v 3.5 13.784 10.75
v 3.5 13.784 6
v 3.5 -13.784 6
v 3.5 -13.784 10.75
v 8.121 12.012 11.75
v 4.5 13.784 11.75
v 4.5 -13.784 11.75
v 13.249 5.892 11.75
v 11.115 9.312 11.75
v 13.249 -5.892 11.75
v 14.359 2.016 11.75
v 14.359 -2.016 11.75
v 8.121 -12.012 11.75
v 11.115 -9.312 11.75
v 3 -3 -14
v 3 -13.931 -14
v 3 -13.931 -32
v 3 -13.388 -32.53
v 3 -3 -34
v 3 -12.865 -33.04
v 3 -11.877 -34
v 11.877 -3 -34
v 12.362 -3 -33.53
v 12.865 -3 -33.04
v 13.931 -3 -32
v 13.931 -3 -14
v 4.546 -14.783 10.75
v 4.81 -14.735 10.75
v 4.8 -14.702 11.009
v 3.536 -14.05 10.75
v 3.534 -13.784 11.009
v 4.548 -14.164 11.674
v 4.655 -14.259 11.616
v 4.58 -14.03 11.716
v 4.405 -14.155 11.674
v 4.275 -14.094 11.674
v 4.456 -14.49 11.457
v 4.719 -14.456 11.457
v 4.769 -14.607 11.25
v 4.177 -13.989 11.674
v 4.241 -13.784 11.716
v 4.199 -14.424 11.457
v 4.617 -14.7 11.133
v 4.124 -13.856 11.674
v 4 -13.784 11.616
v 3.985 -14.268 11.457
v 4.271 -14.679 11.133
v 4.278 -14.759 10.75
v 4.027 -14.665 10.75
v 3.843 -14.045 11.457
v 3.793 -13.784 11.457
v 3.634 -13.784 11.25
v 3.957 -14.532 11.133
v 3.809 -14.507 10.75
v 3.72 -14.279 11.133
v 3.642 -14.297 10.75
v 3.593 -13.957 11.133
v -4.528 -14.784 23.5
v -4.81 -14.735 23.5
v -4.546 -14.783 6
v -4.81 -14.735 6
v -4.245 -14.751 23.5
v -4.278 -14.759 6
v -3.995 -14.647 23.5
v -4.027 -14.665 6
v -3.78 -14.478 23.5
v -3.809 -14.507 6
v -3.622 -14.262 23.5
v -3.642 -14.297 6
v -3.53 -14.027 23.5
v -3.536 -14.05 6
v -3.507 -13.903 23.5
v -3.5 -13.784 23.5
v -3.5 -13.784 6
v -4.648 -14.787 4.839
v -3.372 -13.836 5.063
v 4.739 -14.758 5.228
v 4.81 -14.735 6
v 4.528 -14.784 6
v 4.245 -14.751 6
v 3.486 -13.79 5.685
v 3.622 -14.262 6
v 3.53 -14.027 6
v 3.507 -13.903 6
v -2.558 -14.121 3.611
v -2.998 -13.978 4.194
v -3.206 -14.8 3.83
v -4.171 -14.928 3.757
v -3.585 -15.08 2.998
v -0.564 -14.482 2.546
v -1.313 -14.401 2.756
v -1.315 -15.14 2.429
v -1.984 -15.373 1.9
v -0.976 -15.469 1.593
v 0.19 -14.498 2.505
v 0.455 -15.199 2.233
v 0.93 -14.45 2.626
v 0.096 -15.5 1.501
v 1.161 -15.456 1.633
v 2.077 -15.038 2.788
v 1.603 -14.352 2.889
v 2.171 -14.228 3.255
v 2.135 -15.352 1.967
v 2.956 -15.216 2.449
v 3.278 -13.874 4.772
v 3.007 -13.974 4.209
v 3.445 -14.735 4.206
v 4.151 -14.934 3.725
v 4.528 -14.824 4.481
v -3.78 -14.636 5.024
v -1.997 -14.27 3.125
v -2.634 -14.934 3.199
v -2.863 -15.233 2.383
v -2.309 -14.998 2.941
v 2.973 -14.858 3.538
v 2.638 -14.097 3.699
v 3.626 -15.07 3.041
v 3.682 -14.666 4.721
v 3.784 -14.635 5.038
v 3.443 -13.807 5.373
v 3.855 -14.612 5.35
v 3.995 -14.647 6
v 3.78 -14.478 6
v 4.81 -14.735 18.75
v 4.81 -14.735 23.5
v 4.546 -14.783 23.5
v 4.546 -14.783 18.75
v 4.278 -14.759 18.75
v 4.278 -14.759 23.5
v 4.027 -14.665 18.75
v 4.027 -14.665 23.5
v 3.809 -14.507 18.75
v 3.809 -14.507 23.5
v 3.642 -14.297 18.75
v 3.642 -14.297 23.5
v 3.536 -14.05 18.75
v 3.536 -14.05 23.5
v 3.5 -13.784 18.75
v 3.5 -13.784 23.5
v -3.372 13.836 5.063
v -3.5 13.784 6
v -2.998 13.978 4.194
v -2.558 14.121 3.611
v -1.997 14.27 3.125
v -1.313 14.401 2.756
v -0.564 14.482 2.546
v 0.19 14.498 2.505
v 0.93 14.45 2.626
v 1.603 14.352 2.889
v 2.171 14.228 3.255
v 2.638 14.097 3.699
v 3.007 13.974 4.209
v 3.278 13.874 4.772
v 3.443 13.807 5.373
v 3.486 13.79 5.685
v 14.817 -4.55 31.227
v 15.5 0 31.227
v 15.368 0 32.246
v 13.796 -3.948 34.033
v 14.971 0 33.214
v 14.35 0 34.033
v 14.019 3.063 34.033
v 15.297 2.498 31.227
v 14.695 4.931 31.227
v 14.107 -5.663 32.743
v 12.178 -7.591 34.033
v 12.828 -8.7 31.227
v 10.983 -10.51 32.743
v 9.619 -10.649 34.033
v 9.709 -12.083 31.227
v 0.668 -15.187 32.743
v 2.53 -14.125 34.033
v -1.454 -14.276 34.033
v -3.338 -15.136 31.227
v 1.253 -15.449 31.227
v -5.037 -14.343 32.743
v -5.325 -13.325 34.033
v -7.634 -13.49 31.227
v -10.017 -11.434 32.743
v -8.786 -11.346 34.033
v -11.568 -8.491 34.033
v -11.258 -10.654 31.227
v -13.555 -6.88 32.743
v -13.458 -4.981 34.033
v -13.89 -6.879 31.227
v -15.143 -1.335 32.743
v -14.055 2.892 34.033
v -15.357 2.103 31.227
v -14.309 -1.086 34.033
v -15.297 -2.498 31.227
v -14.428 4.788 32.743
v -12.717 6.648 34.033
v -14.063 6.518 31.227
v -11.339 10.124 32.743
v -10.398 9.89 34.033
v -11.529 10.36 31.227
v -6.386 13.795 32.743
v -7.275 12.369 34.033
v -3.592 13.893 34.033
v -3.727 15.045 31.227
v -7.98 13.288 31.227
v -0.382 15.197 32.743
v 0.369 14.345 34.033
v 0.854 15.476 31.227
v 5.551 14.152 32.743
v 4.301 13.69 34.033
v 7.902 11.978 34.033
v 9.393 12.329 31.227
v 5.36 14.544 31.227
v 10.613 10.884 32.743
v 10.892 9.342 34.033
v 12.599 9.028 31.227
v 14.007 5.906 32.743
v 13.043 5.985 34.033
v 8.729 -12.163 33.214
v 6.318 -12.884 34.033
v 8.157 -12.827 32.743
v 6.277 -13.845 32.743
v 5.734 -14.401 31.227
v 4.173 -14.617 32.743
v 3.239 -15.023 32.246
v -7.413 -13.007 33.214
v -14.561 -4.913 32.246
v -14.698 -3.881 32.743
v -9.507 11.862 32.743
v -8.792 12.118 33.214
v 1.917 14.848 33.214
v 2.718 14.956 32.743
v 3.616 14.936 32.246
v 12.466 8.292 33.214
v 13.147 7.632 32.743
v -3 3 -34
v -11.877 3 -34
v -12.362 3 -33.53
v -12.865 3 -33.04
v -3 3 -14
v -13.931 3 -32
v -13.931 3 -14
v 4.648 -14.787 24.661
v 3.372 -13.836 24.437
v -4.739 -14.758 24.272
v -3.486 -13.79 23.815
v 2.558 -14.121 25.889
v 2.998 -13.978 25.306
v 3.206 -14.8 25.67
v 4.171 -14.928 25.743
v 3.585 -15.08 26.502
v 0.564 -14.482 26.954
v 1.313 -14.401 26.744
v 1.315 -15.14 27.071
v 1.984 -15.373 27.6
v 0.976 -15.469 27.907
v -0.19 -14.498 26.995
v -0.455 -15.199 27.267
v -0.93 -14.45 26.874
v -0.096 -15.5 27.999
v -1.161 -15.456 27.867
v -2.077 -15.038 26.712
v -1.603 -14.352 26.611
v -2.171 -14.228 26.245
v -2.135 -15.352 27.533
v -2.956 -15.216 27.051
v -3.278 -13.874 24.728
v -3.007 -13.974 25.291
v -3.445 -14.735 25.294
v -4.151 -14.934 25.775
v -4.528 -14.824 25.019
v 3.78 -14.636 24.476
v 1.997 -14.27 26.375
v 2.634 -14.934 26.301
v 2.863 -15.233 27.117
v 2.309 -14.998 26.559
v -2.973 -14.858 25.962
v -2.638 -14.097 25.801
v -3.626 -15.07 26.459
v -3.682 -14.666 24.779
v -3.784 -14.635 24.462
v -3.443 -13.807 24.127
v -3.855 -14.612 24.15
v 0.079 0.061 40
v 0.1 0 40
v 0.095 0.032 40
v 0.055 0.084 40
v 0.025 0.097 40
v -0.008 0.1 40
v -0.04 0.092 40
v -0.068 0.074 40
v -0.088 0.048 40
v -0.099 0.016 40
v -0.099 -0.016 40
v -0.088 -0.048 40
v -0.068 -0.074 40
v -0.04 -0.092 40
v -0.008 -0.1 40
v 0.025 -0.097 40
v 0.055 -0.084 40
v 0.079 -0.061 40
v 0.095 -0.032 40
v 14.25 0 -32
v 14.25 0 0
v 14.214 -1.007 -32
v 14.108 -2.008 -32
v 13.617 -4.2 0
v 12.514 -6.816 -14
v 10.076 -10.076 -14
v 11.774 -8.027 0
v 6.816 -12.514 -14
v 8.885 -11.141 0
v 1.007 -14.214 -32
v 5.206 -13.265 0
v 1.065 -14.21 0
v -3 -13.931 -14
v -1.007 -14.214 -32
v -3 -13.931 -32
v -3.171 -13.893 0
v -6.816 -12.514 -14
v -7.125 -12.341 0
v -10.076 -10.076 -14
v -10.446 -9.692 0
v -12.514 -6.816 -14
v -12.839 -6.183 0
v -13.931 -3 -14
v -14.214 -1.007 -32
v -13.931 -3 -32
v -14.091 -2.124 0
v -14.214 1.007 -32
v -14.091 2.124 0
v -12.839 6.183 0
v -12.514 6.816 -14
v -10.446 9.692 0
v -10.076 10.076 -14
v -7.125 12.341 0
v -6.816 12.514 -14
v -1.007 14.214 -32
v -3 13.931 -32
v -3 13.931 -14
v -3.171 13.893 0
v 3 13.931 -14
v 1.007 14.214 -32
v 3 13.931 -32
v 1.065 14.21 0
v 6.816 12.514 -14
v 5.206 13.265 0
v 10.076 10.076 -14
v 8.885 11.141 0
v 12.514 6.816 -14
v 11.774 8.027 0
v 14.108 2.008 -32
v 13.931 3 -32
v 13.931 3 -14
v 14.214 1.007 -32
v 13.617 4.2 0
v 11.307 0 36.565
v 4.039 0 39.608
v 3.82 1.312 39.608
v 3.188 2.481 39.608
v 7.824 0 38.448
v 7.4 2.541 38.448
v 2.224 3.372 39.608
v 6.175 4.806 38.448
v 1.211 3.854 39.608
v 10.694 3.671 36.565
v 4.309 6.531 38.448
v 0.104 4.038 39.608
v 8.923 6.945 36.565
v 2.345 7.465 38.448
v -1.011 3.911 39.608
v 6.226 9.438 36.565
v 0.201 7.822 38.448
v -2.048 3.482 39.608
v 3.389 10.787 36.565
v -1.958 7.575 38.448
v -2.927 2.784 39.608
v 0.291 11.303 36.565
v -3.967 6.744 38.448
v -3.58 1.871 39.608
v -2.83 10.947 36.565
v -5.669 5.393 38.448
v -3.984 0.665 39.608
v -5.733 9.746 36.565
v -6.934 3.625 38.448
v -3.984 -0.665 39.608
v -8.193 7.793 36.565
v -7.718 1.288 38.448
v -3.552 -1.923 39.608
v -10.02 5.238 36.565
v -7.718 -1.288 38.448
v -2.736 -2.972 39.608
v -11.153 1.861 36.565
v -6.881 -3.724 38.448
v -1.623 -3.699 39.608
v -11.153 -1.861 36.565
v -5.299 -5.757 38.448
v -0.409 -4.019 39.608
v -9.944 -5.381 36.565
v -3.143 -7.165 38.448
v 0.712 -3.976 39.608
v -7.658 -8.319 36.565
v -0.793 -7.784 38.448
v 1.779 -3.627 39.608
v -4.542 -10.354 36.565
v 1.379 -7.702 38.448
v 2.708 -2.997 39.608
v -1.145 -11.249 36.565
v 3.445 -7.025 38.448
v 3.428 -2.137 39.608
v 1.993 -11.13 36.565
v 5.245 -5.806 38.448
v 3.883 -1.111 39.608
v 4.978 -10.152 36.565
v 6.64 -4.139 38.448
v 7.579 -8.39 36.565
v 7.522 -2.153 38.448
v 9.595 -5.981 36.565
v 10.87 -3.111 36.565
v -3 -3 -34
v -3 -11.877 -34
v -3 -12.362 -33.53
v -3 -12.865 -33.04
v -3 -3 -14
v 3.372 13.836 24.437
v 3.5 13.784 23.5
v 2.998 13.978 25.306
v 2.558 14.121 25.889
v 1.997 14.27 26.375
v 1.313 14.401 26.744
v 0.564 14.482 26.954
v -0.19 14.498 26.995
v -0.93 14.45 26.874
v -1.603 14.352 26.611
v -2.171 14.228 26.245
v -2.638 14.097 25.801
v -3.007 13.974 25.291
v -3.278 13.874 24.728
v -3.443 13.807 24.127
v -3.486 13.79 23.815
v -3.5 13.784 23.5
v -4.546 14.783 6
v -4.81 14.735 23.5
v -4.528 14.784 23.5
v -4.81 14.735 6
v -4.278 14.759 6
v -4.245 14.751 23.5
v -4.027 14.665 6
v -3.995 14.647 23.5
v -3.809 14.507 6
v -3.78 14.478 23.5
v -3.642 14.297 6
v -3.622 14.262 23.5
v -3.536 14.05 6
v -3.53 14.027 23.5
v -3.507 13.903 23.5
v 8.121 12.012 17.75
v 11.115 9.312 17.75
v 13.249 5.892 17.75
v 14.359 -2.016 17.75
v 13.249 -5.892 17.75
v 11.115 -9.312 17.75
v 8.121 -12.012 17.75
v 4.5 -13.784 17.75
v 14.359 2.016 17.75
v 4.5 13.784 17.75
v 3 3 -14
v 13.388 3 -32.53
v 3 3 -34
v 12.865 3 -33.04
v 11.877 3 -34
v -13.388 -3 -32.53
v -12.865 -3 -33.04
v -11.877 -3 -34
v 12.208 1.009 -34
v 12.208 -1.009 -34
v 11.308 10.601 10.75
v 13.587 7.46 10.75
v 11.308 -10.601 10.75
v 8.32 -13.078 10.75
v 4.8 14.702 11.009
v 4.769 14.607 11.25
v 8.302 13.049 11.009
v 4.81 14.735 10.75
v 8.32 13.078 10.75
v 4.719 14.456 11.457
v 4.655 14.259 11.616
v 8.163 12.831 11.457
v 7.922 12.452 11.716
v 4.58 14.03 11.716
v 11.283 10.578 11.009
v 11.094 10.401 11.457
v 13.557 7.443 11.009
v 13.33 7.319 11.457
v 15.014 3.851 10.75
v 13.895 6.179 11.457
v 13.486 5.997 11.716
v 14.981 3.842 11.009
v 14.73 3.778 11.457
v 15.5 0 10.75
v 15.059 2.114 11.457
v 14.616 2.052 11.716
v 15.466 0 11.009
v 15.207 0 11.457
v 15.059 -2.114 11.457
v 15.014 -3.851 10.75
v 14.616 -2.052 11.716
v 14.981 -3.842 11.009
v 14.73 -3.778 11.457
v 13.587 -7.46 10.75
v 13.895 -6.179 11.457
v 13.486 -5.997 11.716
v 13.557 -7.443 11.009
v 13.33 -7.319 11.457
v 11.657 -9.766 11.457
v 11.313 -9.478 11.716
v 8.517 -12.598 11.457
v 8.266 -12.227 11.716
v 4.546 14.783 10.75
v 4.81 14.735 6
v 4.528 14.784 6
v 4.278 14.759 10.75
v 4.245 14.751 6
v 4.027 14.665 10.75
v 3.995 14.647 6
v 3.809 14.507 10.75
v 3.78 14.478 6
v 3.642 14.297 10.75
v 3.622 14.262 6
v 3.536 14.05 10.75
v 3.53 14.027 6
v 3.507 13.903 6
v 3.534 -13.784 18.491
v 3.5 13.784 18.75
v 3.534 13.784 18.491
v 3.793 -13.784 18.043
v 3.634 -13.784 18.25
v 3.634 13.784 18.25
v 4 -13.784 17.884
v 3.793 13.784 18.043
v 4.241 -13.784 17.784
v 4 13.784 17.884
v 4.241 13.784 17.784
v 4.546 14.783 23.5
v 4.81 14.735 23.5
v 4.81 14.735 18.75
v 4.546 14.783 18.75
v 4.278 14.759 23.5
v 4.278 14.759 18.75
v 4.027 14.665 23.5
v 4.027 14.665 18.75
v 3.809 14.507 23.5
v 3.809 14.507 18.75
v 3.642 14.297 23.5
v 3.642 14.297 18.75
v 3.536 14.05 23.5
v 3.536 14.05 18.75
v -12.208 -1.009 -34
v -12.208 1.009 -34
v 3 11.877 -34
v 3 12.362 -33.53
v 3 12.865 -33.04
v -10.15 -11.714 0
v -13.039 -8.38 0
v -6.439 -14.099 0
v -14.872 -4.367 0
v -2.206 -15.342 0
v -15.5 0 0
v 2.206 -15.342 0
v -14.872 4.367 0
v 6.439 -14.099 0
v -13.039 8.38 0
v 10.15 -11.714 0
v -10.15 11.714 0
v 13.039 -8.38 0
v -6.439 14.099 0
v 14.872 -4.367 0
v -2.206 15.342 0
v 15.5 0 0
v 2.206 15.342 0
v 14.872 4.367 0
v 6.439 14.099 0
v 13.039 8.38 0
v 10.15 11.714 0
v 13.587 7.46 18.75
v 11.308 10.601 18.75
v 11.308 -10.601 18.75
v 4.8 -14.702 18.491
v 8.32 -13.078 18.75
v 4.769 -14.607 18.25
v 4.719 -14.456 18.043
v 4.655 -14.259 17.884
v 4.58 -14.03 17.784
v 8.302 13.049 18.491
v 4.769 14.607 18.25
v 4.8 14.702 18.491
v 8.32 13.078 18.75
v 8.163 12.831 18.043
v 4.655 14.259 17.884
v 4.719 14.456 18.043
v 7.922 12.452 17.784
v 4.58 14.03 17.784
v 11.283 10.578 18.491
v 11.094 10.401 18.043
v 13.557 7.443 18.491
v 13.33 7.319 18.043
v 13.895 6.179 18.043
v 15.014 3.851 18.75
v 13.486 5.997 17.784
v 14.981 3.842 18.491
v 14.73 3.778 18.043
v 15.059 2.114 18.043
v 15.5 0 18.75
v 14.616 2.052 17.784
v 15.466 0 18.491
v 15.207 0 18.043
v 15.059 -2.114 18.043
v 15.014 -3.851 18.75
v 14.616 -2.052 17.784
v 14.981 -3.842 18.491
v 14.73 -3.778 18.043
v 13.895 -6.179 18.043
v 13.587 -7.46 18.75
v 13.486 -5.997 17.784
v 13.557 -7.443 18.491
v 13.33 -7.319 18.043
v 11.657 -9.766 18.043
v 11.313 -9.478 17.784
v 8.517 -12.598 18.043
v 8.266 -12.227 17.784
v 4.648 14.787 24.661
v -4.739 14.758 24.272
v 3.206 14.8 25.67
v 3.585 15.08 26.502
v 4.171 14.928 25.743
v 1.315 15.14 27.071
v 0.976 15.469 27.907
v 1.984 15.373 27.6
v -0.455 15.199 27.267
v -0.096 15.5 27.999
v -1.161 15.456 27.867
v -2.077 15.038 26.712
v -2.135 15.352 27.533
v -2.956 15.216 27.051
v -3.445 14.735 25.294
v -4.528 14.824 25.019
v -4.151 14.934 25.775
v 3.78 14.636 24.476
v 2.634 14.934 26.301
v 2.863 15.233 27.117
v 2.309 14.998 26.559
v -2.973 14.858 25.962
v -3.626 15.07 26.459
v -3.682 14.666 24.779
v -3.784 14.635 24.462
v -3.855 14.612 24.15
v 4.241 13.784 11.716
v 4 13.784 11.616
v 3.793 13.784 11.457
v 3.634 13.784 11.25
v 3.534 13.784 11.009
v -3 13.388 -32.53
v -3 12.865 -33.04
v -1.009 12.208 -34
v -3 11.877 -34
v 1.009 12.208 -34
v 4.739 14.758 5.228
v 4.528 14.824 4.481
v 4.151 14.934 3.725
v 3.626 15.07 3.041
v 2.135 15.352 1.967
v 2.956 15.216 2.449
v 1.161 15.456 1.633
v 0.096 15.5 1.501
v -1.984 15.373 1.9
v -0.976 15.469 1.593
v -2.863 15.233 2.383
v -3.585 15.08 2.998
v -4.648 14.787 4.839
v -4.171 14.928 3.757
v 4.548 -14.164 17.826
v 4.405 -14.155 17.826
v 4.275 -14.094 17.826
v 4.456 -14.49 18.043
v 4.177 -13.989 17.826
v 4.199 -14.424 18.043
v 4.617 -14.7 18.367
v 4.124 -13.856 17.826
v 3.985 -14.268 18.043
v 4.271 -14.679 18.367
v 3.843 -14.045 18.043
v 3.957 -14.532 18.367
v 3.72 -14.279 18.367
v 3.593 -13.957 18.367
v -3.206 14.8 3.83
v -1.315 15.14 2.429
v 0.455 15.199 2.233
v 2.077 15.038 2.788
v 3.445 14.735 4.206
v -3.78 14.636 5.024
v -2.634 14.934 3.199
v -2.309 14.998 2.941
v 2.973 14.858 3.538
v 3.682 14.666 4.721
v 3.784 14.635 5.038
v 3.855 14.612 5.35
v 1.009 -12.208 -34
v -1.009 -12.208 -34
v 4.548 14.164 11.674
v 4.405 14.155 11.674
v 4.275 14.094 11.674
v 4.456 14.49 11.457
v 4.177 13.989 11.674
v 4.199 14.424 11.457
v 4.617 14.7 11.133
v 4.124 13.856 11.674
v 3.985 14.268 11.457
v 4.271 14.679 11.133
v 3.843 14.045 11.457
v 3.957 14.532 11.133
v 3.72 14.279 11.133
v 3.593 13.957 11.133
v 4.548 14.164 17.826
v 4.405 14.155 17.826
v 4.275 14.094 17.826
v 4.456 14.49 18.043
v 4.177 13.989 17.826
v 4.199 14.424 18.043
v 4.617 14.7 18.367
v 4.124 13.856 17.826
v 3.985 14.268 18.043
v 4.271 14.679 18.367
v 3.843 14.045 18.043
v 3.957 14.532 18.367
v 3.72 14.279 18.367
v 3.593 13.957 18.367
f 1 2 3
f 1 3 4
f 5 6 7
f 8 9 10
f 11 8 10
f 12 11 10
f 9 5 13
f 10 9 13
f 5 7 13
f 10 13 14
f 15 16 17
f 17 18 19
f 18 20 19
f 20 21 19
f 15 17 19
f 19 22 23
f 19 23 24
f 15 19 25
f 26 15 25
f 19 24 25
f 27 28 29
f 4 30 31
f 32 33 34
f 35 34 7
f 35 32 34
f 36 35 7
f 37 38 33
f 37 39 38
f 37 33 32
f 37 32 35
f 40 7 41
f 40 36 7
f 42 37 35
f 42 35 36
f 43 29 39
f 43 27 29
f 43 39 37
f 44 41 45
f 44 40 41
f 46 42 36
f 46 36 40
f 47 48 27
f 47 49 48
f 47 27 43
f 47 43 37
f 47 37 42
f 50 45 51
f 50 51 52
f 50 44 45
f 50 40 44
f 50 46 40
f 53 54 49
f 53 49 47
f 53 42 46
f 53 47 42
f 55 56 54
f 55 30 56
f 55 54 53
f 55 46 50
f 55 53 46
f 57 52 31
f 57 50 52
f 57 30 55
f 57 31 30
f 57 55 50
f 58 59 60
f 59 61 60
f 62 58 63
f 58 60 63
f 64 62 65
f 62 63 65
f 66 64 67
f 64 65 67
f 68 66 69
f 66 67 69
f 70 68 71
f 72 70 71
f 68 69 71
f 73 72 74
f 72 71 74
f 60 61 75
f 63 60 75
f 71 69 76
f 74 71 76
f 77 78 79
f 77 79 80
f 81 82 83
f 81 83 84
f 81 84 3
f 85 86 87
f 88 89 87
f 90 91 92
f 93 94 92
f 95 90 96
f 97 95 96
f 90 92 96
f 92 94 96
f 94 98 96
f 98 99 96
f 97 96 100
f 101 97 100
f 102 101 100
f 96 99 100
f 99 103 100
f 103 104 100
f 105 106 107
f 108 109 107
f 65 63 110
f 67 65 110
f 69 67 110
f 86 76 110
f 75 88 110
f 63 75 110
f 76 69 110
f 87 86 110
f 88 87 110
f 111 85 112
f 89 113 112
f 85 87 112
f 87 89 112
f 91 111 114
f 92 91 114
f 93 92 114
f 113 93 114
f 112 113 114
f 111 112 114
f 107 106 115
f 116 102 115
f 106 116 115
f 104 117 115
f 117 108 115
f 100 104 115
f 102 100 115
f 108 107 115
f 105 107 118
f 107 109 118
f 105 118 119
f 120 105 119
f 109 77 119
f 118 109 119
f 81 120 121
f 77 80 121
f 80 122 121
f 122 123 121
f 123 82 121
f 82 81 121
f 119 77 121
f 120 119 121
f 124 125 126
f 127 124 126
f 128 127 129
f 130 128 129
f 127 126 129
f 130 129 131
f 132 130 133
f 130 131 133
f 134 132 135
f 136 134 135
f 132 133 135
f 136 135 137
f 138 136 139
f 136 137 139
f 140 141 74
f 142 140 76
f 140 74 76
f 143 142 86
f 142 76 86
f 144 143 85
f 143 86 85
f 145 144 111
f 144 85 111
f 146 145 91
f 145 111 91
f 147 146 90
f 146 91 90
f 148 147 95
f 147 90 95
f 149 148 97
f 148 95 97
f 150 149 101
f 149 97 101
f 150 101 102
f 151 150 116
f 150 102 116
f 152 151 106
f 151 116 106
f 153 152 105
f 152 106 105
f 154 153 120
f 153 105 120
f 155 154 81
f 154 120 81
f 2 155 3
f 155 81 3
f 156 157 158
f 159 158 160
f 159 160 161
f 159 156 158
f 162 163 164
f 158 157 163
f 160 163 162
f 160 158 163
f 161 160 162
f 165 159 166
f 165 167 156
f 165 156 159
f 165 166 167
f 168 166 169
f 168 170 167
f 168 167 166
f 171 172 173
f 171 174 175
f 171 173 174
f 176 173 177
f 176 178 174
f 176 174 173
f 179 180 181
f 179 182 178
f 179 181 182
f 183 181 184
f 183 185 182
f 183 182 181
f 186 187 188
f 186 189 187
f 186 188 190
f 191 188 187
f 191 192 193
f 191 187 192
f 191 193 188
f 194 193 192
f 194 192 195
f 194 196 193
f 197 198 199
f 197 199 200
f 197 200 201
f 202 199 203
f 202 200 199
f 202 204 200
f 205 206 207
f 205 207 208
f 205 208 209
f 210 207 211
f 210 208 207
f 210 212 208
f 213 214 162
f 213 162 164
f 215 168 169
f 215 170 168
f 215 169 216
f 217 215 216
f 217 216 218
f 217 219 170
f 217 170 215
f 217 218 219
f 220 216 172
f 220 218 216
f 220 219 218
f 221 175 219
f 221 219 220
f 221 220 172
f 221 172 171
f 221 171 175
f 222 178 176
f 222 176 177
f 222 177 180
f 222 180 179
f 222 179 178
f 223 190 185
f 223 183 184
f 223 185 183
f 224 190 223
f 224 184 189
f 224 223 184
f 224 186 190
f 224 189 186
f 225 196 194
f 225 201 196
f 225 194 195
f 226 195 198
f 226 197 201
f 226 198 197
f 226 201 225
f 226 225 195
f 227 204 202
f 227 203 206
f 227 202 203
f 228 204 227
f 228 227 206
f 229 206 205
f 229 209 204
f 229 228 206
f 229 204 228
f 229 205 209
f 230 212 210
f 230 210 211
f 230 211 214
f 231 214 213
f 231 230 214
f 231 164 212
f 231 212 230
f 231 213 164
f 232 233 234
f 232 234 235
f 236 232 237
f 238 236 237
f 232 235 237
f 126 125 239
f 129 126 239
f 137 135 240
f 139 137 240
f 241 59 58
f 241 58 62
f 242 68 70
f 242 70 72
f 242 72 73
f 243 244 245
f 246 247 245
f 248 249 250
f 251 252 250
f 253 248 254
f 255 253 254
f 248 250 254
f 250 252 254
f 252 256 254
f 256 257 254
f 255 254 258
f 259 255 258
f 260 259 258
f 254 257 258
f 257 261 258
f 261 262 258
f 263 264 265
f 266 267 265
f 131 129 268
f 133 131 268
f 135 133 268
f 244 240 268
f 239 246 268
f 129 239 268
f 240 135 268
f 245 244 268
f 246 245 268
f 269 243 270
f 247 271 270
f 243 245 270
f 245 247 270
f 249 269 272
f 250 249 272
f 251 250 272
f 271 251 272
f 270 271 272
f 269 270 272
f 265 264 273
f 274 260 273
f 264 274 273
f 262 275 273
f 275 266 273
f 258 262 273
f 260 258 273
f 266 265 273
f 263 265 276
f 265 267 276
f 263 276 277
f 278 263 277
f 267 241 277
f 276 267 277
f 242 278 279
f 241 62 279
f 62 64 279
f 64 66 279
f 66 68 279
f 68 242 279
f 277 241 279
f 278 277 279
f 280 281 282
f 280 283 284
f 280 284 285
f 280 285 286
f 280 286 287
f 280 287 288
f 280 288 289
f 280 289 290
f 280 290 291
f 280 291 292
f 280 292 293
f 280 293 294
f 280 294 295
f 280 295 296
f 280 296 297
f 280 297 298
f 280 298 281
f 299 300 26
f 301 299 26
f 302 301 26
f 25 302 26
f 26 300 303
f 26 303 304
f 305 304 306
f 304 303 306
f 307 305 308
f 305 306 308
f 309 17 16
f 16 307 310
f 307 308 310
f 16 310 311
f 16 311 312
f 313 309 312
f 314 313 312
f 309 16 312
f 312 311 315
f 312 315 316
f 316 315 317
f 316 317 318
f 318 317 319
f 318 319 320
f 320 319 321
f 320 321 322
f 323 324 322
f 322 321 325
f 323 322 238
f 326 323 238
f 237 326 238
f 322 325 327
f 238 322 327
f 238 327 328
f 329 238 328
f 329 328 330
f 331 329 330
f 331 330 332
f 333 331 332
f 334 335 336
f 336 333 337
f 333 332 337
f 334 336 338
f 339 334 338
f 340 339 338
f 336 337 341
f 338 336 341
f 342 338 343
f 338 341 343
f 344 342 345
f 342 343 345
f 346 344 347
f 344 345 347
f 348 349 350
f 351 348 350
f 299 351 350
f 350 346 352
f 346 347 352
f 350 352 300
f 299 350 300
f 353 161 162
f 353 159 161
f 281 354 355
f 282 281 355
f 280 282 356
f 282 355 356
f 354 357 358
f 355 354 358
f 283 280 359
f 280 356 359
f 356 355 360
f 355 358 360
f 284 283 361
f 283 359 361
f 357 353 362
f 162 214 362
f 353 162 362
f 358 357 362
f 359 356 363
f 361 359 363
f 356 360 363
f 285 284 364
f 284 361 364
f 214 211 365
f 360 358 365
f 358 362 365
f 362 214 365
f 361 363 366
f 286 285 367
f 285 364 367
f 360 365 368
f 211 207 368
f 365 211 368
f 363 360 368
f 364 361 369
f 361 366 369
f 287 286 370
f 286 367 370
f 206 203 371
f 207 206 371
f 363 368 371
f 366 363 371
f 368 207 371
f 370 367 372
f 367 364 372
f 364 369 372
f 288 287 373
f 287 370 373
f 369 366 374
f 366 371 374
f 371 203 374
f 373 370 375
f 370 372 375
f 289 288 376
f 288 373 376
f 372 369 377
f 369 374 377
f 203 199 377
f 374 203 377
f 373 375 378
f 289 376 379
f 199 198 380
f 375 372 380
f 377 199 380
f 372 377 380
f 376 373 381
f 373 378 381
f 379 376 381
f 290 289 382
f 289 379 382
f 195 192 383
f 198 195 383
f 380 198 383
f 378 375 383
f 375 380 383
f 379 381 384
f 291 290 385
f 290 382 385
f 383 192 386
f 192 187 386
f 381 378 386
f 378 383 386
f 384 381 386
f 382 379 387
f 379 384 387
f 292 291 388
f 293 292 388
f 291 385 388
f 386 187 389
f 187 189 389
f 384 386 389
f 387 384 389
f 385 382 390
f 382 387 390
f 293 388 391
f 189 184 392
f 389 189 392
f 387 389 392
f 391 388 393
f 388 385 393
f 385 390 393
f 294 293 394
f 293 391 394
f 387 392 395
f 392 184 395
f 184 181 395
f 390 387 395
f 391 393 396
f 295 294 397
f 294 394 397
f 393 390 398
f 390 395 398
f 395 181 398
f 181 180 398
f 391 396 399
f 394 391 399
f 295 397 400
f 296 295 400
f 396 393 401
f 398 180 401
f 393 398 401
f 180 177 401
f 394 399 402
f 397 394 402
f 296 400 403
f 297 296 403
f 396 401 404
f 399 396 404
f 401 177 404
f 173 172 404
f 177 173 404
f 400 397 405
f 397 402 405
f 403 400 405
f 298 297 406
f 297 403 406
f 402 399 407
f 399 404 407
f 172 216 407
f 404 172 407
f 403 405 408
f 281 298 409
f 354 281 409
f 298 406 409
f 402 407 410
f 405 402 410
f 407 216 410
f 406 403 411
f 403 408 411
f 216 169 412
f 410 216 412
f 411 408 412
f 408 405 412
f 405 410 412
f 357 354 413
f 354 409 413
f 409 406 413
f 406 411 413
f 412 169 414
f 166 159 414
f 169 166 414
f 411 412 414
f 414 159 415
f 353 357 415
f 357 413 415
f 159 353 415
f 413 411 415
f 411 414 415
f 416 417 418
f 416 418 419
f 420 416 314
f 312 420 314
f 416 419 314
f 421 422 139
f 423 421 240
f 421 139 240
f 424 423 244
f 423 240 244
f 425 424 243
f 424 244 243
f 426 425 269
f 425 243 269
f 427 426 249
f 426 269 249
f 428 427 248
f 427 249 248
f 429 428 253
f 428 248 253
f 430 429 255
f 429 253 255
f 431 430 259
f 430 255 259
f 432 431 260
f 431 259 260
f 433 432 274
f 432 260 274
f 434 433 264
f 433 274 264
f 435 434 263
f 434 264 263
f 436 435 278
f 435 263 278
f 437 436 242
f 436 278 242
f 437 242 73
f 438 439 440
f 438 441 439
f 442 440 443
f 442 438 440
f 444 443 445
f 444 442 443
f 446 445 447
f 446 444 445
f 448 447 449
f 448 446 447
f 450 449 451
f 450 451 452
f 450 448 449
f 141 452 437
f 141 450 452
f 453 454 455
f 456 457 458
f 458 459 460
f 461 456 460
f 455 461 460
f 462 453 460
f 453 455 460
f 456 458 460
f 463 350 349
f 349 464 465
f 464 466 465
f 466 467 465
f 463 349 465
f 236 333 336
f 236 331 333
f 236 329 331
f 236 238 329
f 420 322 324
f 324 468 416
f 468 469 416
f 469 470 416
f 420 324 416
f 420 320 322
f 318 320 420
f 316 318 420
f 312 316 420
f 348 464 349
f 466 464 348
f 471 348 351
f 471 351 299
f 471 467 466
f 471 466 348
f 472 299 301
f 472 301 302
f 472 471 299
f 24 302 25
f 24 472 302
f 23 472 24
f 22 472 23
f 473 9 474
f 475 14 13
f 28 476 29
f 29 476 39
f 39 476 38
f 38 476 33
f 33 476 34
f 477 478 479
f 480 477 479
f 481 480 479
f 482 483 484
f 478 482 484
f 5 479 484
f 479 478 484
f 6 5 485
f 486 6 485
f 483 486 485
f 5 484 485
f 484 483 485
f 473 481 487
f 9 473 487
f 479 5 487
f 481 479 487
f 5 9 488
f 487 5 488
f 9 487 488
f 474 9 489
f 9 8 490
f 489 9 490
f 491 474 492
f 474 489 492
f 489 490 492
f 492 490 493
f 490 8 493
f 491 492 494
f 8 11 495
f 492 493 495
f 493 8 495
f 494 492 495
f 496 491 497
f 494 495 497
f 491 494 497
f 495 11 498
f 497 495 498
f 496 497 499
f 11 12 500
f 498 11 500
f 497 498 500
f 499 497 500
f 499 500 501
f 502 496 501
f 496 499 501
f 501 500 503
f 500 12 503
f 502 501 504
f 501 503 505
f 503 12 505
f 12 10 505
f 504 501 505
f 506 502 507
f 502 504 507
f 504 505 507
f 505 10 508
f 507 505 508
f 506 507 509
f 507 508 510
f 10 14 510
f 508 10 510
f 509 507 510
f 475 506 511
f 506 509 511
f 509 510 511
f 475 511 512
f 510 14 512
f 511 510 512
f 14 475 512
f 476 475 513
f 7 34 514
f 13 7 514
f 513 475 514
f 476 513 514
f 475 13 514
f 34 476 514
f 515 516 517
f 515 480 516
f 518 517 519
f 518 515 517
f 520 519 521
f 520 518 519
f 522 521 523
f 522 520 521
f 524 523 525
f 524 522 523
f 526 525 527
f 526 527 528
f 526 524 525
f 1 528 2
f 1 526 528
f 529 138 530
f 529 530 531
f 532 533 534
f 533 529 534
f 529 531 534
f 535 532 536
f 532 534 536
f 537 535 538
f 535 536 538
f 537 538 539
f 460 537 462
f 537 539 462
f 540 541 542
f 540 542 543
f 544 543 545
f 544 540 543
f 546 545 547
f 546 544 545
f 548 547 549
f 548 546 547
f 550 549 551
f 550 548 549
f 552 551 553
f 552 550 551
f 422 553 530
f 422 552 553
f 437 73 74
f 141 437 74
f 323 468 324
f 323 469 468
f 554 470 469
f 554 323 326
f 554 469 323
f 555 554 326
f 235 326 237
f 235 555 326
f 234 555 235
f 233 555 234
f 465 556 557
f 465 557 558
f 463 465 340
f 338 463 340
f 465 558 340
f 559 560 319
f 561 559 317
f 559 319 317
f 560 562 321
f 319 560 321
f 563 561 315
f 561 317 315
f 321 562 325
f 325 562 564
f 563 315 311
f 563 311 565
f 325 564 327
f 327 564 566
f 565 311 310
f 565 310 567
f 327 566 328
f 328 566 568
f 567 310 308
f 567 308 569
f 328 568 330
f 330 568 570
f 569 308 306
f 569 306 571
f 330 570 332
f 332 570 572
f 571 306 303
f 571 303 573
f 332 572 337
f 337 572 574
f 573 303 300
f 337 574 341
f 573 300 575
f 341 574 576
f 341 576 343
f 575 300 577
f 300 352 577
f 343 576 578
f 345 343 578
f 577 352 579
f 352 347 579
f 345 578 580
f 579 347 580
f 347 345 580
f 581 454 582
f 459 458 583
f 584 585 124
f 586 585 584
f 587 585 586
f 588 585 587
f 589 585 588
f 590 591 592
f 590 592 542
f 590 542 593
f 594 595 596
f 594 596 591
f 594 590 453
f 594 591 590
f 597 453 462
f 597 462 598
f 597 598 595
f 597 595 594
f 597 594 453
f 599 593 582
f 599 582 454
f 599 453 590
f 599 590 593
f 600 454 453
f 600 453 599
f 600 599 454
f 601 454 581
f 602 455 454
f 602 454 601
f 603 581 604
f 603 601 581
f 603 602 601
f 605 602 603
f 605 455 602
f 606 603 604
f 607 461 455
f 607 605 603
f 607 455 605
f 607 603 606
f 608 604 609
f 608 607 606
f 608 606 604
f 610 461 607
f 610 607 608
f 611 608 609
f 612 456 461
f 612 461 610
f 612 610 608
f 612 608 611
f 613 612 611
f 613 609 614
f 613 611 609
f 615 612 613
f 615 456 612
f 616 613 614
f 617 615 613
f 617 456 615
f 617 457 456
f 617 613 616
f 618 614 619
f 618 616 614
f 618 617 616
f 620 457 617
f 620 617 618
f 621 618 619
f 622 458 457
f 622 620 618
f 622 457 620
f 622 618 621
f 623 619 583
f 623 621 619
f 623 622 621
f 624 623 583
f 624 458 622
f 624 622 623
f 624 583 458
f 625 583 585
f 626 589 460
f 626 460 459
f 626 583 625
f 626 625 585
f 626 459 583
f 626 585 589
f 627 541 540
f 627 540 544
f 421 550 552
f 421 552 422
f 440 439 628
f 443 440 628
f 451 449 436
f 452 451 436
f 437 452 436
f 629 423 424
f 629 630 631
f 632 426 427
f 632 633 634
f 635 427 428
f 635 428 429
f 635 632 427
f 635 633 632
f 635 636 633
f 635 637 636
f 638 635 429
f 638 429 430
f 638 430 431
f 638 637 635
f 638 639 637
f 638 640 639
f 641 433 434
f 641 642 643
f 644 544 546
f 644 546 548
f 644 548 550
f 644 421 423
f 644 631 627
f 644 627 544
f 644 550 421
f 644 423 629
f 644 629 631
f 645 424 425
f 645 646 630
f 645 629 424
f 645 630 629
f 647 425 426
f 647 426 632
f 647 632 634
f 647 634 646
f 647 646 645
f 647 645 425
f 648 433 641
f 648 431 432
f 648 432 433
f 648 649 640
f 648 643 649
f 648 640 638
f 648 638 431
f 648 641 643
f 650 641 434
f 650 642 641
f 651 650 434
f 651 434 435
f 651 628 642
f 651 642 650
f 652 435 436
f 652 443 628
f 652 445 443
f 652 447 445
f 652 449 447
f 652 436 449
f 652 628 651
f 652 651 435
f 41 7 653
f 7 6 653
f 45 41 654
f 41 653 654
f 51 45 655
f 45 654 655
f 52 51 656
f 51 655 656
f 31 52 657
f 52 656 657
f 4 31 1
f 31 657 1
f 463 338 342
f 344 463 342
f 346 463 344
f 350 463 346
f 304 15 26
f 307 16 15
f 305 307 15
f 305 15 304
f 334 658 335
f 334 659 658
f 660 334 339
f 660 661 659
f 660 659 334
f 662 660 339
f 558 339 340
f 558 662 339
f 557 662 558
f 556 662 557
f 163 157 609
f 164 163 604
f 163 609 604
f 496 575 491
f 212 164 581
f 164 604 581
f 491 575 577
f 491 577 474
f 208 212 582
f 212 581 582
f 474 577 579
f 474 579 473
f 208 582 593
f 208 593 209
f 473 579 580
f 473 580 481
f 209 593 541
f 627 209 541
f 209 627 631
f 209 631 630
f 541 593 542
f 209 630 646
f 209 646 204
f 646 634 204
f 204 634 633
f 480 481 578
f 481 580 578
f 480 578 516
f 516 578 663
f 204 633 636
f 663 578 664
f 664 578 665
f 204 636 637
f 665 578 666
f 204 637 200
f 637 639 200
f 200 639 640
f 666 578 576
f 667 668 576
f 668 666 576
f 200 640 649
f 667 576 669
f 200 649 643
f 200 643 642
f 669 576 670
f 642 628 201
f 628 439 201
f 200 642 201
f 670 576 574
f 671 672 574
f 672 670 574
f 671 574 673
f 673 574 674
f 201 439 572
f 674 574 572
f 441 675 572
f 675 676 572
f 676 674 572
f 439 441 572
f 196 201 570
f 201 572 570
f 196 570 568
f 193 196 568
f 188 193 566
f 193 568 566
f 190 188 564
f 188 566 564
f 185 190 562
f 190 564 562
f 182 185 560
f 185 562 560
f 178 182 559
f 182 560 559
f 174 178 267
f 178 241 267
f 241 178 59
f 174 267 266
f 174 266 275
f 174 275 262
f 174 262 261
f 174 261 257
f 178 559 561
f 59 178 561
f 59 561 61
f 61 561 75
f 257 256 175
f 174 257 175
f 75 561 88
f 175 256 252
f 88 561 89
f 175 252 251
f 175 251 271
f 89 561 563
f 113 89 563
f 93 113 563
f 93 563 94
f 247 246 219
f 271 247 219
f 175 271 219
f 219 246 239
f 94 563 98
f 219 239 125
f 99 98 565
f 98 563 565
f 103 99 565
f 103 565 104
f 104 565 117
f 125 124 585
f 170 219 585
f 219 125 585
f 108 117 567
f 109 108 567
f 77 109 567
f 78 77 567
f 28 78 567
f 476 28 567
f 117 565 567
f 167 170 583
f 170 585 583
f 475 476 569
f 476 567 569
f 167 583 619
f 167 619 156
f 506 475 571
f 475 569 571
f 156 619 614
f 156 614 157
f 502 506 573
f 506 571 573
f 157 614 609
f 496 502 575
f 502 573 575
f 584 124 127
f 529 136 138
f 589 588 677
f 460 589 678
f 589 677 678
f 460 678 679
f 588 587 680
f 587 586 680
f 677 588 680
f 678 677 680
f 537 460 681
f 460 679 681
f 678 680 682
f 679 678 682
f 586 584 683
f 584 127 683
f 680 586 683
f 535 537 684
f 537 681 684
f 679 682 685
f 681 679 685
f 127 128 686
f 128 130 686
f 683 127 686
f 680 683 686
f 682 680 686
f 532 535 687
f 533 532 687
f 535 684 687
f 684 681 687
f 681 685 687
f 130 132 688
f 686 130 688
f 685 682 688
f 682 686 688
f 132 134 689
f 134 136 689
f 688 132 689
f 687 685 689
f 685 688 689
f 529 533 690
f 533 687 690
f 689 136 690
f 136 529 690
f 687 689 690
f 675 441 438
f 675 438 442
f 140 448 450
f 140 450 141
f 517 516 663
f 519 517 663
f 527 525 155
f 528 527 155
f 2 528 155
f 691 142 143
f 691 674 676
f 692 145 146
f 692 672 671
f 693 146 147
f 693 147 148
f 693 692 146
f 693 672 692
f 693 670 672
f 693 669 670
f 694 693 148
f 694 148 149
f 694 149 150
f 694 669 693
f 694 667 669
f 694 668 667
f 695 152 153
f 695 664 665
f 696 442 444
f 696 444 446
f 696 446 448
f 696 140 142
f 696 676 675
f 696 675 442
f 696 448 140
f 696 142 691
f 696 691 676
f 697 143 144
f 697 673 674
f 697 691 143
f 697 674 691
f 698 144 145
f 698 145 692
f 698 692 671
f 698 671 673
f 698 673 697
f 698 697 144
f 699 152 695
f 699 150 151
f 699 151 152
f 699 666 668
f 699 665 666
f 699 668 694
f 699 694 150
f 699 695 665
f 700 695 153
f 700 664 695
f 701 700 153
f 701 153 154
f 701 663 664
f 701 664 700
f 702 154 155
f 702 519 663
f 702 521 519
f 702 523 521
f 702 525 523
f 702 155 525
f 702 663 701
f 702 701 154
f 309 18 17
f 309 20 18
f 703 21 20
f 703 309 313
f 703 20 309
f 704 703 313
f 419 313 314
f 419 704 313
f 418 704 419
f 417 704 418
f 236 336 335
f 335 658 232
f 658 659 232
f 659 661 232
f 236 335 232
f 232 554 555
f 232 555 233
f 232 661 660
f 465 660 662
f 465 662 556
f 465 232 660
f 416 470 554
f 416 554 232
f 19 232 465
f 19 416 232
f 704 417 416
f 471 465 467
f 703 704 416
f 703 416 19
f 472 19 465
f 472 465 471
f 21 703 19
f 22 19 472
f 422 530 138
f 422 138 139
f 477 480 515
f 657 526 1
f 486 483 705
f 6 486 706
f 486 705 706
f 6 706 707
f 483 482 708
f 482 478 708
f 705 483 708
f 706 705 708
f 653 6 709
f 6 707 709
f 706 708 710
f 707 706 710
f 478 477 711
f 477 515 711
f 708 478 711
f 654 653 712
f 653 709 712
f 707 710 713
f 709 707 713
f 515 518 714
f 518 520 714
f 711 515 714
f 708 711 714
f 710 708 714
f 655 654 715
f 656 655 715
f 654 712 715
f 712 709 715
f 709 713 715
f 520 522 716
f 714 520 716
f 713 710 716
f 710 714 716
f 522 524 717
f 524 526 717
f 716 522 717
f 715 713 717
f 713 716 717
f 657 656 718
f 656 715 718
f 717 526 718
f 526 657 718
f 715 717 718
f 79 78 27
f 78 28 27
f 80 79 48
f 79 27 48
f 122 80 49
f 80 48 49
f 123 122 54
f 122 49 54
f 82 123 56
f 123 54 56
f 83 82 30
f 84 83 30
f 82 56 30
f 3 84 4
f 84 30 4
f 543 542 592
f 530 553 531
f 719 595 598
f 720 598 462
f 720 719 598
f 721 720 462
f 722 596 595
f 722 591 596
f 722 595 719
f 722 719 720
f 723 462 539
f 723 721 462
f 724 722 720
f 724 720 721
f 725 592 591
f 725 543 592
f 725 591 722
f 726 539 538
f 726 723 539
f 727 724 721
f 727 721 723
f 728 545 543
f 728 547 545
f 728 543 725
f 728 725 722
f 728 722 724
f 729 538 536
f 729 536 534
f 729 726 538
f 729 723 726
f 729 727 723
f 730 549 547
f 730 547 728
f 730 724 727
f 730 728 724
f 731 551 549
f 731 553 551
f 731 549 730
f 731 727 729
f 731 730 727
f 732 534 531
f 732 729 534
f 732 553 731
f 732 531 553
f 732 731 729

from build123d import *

# Parameters (mm, degrees)
F0_R      = 15.5
F1_DEPTH  = 40
F4_DEPTH  = 40
F5_R      = 1
F6_R      = 14.25
F7_DEPTH  = 34
F8_SIZE   = 2
F10_DEPTH = 20
F13_R     = 4


with BuildPart() as f1:
    # F0 (on Top) → F1 (new body)
    with BuildSketch(Plane.XY):
        Circle(F0_R)
    extrude(amount=F1_DEPTH)

    # F3 (on offset) → F4 (cut)
    with BuildSketch(Plane.XZ.offset(20)):
        with BuildLine():
            Line((19.5, 11.75), (19.5, 17.75))
            Line((19.5, 17.75), (3.5, 17.75))
            Line((3.5, 17.75), (3.5, 23.5))
            ThreePointArc((3.5, 23.5), (0, 27), (-3.5, 23.5))
            Line((-3.5, 23.5), (-3.5, 6))
            ThreePointArc((-3.5, 6), (0, 2.5), (3.5, 6))
            Line((3.5, 6), (3.5, 11.75))
            Line((3.5, 11.75), (19.5, 11.75))
        make_face()
    extrude(amount=-F4_DEPTH, mode=Mode.SUBTRACT)

    # F5
    f5_edges = [f1.edges().sort_by_distance(p)[0] for p in [
        (0, -15.5, 27),
        (0, 15.5, 27),
        (12.134661, -9.643651, 17.75),
        (12.134661, 9.643651, 17.75),
        (12.134661, -9.643651, 11.75),
        (12.134661, 9.643651, 11.75),
        (-3.5, -15.099669, 14.75),
        (-3.5, 15.099669, 14.75),
        (3.5, 0, 17.75),
        (3.5, 0, 11.75),
    ]]
    fillet(f5_edges, radius=F5_R)

    # F6 (on face) → F7 (join)
    with BuildSketch(Plane(origin=(0, 0, 0), x_dir=(1, 0, 0), z_dir=(0, 0, -1))):
        Circle(F6_R)
    extrude(amount=F7_DEPTH)

    # F8
    f8_edges = [f1.edges().sort_by_distance(p)[0] for p in [
        (-14.25, 0, -34),
    ]]
    chamfer(f8_edges, length=F8_SIZE)

    # F9 (on face) → F10 (cut)
    with BuildSketch(Plane(origin=(0, 0, -34), x_dir=(1, 0, 0), z_dir=(0, 0, -1))):
        Polygon((3, 21.450706), (3, 3), (33.327906, 3), align=None)
        Polygon((-23, 3), (-3, 3), (-3, 21.450706), align=None)
        Polygon((-3, -23), (-3, -3), (-23, -3), align=None)
        Polygon((33.327906, -3), (3, -3), (3, -23), align=None)
    extrude(amount=-F10_DEPTH, mode=Mode.SUBTRACT)

    # F11 (on Front) → F12 (revolve, cut)
    with BuildSketch(Plane.XZ):
        with BuildLine():
            ThreePointArc((0.1, 40), (14.242136, 34.142136), (20.1, 20))
            Line((20.1, 20), (20.1, 40))
            Line((20.1, 40), (0.1, 40))
        make_face()
    revolve(axis=Axis((0, 0, 20), (0, 0, 1)), mode=Mode.SUBTRACT)

    # F13
    f13_edges = [f1.edges().sort_by_distance(p)[0] for p in [
        (-15.5, 0, 32.760878),
    ]]
    fillet(f13_edges, radius=F13_R)


solid = f1.part
